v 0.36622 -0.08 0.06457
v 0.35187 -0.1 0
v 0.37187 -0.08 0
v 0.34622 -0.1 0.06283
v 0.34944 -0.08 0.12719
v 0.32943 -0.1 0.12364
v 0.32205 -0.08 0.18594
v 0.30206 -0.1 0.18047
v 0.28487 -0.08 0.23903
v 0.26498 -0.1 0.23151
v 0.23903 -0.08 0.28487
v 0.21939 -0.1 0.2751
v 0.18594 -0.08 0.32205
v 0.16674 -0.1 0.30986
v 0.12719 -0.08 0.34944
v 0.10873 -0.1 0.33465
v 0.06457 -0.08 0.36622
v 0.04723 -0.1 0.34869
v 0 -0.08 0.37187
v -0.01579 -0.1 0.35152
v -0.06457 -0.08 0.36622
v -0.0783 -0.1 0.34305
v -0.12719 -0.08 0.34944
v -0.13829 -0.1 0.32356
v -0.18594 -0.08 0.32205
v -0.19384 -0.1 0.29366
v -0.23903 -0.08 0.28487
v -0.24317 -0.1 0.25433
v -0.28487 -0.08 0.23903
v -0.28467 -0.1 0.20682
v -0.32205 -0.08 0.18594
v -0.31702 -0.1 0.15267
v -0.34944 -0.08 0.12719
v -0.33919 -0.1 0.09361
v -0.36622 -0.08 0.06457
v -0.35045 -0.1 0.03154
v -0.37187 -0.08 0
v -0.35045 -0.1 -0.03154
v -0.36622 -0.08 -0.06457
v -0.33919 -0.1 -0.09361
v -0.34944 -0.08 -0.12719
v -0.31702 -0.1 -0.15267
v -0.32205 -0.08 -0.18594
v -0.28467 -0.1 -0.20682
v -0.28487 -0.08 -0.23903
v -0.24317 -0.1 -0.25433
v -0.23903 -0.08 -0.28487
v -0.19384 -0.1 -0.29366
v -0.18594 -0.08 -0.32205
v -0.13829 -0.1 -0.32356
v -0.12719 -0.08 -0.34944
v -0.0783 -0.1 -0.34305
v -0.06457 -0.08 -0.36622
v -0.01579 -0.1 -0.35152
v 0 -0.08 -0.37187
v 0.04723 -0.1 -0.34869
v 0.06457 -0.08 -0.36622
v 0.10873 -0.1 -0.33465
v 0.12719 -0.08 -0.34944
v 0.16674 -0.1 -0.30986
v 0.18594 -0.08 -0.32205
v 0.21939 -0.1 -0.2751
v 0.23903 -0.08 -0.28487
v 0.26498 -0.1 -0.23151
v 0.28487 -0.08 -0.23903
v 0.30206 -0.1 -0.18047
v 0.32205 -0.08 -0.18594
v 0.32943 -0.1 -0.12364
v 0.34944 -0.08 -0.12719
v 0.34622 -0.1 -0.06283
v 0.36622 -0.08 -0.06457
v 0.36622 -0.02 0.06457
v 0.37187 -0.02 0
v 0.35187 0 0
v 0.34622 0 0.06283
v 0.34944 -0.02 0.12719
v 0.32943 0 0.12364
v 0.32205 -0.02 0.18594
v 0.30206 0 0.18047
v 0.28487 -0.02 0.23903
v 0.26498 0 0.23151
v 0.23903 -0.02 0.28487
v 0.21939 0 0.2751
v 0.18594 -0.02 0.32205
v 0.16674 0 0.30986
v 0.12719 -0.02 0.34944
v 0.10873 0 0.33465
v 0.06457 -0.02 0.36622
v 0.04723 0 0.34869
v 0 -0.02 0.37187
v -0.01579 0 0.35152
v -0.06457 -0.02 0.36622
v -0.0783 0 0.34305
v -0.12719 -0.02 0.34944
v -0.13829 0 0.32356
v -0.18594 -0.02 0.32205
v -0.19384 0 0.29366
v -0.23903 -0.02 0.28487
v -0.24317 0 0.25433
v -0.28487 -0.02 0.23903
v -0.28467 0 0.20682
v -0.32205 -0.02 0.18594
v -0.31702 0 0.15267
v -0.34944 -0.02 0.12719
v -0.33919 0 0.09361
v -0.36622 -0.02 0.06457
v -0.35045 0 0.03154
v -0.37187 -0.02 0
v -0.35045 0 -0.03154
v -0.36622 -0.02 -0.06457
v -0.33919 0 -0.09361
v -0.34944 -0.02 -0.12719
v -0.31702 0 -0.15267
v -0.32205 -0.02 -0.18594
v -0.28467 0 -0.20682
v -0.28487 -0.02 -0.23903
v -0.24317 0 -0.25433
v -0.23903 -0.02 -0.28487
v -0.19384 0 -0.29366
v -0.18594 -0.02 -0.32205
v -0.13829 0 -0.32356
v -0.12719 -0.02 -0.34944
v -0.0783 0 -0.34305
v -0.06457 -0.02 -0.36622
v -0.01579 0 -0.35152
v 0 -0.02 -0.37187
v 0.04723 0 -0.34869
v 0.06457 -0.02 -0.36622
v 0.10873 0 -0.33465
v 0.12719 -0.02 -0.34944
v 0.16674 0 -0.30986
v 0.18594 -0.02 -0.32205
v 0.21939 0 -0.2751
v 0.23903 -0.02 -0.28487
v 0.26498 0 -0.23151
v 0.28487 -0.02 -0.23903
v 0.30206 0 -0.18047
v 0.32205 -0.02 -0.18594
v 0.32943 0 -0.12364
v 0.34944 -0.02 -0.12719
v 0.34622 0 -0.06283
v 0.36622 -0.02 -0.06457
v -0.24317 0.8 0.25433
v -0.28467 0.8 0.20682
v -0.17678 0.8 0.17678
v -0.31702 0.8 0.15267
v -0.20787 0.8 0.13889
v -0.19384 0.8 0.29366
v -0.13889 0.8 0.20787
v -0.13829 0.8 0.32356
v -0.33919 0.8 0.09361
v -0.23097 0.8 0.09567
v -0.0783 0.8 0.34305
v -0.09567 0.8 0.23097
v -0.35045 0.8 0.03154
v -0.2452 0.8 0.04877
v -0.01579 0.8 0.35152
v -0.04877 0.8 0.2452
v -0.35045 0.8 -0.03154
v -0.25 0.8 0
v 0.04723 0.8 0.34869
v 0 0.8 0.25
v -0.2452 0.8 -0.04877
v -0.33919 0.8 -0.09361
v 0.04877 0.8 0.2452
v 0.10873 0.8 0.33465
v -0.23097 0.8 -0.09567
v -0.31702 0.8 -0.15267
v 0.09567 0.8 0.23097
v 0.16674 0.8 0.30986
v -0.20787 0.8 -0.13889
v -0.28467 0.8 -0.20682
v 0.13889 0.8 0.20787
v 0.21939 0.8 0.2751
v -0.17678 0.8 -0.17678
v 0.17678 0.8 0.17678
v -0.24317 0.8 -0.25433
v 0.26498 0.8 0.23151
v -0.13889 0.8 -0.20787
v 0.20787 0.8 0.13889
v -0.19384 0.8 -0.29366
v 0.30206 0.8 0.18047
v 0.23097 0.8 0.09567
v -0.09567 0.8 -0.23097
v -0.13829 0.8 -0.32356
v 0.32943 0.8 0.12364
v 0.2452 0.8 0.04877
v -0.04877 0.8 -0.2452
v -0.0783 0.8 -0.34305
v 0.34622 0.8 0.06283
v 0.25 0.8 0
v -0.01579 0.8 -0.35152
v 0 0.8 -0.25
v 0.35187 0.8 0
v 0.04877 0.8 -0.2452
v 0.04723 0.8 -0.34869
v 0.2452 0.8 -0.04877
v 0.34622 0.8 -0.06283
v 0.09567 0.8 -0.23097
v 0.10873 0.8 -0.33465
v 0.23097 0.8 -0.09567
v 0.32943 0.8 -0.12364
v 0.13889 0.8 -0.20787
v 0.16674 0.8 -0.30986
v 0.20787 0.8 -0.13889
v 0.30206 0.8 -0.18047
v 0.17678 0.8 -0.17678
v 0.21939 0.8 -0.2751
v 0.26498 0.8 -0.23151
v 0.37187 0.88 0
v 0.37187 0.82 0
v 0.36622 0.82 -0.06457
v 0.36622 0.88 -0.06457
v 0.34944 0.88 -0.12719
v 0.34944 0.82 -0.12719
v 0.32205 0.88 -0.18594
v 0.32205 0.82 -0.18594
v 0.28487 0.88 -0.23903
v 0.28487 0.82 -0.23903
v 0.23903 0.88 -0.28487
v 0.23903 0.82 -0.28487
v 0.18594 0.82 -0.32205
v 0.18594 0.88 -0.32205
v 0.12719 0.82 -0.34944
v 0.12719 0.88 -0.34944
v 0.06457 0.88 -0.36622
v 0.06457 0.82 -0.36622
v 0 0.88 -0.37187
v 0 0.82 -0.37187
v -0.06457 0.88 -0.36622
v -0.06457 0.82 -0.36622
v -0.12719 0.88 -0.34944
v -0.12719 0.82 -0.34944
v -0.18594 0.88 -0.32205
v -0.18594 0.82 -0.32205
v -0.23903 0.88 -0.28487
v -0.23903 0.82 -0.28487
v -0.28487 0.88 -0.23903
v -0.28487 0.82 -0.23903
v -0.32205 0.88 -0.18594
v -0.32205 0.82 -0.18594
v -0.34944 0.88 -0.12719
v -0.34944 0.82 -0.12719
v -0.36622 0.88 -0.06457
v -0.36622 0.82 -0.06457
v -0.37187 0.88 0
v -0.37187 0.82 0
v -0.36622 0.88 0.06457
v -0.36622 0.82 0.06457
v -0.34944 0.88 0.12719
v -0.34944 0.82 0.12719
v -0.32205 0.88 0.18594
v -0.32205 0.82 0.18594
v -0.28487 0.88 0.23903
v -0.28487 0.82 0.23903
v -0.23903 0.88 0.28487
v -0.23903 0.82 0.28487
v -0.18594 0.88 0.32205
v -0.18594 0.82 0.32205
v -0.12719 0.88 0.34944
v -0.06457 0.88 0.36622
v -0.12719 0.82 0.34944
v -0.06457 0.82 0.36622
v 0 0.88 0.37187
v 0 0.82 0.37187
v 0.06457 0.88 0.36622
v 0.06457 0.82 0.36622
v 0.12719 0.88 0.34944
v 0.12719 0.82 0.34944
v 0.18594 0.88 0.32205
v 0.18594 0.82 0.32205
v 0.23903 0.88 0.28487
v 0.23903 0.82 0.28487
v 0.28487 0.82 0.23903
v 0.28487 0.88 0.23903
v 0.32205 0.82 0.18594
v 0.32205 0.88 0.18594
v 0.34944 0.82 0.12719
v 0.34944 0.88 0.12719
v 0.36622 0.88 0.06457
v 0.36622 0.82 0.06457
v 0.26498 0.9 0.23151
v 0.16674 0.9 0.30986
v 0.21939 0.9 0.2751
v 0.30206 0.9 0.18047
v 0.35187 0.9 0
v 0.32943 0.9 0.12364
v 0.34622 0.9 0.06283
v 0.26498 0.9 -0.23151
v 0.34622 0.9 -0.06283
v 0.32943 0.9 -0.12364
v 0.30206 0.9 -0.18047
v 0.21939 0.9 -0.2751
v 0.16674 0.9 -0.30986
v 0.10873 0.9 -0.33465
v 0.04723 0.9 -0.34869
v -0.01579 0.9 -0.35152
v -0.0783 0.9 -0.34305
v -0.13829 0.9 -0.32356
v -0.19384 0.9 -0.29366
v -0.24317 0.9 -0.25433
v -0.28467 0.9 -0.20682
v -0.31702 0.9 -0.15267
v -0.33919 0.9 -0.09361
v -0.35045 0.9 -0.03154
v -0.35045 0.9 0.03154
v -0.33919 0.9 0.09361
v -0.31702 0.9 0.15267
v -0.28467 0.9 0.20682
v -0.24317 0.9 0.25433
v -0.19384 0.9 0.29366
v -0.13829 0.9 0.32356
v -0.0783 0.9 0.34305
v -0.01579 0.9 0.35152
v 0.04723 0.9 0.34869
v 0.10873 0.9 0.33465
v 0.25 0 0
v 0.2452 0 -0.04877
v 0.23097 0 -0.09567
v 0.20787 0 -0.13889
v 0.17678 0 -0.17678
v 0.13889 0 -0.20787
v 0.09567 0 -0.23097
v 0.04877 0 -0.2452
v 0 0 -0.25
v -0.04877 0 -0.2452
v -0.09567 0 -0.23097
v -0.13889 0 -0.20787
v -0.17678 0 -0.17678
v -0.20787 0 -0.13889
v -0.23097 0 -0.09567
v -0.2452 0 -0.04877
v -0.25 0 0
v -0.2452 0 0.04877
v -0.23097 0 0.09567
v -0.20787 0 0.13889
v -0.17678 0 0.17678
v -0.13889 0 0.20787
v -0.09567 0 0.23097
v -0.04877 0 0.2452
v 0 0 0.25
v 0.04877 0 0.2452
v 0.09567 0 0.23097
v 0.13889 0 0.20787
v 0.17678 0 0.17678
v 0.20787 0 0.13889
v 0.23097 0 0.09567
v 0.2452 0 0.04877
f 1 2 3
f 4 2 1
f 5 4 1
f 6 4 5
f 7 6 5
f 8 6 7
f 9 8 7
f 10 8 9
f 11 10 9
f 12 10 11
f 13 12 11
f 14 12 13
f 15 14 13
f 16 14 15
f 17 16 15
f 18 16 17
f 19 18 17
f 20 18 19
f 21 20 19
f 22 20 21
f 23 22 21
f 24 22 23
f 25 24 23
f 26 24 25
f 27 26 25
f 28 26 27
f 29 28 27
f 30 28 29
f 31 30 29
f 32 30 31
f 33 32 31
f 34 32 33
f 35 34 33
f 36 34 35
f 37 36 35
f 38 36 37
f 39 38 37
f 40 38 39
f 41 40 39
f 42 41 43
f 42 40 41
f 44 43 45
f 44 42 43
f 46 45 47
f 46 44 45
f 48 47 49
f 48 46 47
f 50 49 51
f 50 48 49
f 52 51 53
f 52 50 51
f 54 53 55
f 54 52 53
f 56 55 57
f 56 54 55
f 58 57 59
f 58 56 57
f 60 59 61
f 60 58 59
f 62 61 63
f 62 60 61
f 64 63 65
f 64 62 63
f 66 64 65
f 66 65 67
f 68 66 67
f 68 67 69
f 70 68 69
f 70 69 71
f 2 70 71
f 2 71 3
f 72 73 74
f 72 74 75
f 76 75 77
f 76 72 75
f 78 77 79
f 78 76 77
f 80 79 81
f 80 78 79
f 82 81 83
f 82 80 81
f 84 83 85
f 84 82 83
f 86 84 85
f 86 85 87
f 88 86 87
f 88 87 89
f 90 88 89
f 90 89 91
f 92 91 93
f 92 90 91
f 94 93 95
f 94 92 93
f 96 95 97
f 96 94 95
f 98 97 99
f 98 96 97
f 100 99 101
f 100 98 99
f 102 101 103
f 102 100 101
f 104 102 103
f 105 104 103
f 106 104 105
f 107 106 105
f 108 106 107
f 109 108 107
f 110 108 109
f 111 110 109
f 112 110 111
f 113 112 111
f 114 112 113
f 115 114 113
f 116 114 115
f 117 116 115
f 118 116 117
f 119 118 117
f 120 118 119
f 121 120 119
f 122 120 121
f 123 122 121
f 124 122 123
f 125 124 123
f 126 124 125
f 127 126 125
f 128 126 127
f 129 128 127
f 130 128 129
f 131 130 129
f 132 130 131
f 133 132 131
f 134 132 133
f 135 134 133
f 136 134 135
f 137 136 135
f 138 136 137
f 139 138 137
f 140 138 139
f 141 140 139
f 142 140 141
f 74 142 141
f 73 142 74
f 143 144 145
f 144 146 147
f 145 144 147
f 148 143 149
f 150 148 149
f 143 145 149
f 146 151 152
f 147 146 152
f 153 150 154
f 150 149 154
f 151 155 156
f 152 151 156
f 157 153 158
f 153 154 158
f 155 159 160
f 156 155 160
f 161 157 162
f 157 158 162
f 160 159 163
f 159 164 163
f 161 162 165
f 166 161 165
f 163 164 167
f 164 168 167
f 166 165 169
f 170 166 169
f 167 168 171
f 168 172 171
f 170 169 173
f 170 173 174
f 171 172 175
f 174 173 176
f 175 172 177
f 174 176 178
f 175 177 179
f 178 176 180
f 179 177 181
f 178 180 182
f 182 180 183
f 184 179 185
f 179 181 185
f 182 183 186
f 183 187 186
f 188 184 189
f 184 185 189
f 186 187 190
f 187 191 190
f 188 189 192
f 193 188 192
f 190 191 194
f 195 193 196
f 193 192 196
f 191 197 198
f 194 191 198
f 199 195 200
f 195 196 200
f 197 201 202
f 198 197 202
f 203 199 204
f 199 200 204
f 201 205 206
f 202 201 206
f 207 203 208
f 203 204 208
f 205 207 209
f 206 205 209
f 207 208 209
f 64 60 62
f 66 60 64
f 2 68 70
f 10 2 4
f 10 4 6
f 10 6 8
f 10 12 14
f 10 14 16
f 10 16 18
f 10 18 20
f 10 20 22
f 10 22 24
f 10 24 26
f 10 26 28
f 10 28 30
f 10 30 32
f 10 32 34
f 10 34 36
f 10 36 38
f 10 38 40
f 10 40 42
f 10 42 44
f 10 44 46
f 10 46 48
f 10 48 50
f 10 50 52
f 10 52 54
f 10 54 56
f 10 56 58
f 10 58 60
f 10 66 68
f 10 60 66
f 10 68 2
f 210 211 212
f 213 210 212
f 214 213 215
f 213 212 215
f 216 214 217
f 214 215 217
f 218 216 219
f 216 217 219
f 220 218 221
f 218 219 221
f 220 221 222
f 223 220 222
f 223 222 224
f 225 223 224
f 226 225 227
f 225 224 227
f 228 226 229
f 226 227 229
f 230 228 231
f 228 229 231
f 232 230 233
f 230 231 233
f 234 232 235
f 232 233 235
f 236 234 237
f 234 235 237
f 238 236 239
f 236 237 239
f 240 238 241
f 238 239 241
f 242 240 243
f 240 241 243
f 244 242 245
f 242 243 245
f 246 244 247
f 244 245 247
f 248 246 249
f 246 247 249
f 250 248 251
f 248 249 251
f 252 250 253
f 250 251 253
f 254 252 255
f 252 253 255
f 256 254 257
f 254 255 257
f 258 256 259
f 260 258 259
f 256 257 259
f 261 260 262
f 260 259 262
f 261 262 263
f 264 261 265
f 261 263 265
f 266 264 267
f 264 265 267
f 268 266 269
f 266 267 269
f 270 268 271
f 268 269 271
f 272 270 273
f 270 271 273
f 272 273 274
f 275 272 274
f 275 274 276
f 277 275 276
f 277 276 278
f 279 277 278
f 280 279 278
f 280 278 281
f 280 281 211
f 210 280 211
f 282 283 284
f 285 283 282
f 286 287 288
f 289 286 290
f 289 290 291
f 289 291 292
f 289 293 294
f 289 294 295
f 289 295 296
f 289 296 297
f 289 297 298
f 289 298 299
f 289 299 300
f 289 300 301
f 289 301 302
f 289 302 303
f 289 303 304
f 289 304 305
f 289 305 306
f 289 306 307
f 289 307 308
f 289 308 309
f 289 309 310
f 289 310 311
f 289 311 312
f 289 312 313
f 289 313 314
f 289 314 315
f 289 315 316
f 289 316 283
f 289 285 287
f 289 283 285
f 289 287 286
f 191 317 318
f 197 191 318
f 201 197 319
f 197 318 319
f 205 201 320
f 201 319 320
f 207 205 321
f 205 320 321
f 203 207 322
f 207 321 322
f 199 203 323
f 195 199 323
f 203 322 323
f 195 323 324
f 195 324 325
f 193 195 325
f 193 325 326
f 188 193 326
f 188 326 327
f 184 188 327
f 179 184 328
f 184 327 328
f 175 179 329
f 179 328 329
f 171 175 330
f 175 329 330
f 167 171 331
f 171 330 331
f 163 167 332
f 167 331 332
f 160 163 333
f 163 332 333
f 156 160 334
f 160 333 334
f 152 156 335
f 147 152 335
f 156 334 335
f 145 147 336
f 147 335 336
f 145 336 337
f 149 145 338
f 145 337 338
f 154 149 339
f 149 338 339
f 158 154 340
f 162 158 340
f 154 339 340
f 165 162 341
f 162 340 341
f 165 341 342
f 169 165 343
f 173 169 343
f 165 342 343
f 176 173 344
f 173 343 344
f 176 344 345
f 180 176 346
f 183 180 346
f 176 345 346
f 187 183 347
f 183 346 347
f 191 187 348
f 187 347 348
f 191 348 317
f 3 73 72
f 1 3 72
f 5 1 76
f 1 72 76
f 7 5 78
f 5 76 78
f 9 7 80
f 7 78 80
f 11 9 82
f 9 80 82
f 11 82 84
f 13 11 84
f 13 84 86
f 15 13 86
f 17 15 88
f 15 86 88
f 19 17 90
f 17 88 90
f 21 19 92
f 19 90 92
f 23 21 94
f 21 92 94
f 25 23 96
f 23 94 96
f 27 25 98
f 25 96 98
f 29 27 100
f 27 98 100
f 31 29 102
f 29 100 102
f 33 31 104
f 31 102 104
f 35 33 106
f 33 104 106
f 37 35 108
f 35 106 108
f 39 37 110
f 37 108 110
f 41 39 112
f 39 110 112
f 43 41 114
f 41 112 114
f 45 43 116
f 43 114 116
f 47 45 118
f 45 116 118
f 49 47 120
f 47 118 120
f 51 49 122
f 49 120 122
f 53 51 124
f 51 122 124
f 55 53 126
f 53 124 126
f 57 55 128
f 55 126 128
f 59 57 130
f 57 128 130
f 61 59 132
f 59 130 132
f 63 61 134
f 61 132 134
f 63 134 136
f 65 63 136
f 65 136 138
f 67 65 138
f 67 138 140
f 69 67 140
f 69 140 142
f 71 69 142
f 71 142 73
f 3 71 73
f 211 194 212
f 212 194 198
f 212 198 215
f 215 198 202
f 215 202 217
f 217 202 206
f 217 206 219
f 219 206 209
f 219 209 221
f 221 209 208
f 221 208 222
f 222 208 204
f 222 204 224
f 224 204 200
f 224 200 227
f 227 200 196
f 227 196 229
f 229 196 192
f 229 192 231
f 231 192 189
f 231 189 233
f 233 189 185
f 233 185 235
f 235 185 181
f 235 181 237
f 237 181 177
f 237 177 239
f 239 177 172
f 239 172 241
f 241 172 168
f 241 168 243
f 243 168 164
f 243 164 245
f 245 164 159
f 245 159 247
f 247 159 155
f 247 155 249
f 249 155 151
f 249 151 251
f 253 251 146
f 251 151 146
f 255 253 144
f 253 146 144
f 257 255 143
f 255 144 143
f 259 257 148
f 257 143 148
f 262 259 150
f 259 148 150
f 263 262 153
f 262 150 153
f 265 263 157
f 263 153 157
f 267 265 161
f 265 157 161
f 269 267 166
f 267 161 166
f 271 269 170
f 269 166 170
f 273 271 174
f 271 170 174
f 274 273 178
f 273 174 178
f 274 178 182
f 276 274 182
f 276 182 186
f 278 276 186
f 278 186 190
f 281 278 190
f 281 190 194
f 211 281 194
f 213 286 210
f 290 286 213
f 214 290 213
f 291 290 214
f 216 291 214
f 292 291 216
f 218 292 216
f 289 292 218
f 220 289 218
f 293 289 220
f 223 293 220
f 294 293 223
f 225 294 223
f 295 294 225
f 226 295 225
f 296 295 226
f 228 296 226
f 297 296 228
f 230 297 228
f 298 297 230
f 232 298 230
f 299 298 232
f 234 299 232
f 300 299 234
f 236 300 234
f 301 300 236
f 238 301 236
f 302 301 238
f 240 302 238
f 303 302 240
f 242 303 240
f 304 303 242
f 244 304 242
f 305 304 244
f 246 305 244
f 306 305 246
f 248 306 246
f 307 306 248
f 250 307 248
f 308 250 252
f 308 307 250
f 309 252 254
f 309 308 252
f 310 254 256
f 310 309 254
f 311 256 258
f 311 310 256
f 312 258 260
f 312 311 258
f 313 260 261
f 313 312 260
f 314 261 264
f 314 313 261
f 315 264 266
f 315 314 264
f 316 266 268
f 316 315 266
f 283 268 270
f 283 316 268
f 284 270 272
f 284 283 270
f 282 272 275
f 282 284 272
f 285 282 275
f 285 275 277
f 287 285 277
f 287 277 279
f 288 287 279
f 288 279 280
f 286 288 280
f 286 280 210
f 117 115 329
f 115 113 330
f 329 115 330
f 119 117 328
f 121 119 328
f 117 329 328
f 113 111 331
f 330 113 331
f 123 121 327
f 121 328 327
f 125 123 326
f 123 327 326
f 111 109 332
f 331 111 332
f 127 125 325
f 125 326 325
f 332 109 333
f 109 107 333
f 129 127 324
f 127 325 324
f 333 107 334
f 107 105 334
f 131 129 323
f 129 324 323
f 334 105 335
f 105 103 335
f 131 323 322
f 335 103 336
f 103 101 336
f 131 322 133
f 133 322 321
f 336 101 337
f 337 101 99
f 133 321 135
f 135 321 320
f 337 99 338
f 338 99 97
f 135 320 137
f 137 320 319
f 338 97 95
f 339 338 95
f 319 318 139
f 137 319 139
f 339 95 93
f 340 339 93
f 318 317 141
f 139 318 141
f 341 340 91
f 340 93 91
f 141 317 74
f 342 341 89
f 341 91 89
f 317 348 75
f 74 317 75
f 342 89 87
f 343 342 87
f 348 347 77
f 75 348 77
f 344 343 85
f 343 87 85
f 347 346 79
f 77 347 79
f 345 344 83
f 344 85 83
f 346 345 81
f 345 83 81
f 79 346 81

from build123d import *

# Parameters (mm, degrees)
SKETCH2_R           = 0.25
BOSS_EXTRUDE1_DEPTH = 0.8
SKETCH3_R           = 0.371871199
BOSS_EXTRUDE2_DEPTH = 0.1
SKETCH4_R           = 0.371871199
BOSS_EXTRUDE3_DEPTH = 0.1
CHAMFER1_SIZE       = 0.02
CHAMFER2_SIZE       = 0.02
CHAMFER3_SIZE       = 0.02


with BuildPart() as part:
    # Sketch2 → Boss-Extrude1 (new body)
    with BuildSketch(Plane(origin=(0, 0, 0), x_dir=(1, 0, 0), z_dir=(0, 1, 0))):
        Circle(SKETCH2_R)
    extrude(amount=BOSS_EXTRUDE1_DEPTH)

    # Sketch3 → Boss-Extrude2 (add)
    with BuildSketch(Plane(origin=(0, 0.8, 0), x_dir=(1, 0, 0), z_dir=(0, 1, 0))):
        Circle(SKETCH3_R)
    extrude(amount=BOSS_EXTRUDE2_DEPTH)

    # Sketch4 → Boss-Extrude3 (add)
    with BuildSketch(Plane.XZ):
        Circle(SKETCH4_R)
    extrude(amount=BOSS_EXTRUDE3_DEPTH)

    # Chamfer1
    chamfer1_edges = [part.edges().sort_by_distance(p)[0] for p in [
        (-0.371871199, 0.9, 0),
    ]]
    chamfer(chamfer1_edges, length=CHAMFER1_SIZE)

    # Chamfer2
    chamfer2_edges = [part.edges().sort_by_distance(p)[0] for p in [
        (-0.371871199, 0.8, 0),
        (-0.371871199, 0, 0),
    ]]
    chamfer(chamfer2_edges, length=CHAMFER2_SIZE)

    # Chamfer3
    chamfer3_edges = [part.edges().sort_by_distance(p)[0] for p in [
        (-0.371871199, -0.1, 0),
    ]]
    chamfer(chamfer3_edges, length=CHAMFER3_SIZE)


solid = part.part
